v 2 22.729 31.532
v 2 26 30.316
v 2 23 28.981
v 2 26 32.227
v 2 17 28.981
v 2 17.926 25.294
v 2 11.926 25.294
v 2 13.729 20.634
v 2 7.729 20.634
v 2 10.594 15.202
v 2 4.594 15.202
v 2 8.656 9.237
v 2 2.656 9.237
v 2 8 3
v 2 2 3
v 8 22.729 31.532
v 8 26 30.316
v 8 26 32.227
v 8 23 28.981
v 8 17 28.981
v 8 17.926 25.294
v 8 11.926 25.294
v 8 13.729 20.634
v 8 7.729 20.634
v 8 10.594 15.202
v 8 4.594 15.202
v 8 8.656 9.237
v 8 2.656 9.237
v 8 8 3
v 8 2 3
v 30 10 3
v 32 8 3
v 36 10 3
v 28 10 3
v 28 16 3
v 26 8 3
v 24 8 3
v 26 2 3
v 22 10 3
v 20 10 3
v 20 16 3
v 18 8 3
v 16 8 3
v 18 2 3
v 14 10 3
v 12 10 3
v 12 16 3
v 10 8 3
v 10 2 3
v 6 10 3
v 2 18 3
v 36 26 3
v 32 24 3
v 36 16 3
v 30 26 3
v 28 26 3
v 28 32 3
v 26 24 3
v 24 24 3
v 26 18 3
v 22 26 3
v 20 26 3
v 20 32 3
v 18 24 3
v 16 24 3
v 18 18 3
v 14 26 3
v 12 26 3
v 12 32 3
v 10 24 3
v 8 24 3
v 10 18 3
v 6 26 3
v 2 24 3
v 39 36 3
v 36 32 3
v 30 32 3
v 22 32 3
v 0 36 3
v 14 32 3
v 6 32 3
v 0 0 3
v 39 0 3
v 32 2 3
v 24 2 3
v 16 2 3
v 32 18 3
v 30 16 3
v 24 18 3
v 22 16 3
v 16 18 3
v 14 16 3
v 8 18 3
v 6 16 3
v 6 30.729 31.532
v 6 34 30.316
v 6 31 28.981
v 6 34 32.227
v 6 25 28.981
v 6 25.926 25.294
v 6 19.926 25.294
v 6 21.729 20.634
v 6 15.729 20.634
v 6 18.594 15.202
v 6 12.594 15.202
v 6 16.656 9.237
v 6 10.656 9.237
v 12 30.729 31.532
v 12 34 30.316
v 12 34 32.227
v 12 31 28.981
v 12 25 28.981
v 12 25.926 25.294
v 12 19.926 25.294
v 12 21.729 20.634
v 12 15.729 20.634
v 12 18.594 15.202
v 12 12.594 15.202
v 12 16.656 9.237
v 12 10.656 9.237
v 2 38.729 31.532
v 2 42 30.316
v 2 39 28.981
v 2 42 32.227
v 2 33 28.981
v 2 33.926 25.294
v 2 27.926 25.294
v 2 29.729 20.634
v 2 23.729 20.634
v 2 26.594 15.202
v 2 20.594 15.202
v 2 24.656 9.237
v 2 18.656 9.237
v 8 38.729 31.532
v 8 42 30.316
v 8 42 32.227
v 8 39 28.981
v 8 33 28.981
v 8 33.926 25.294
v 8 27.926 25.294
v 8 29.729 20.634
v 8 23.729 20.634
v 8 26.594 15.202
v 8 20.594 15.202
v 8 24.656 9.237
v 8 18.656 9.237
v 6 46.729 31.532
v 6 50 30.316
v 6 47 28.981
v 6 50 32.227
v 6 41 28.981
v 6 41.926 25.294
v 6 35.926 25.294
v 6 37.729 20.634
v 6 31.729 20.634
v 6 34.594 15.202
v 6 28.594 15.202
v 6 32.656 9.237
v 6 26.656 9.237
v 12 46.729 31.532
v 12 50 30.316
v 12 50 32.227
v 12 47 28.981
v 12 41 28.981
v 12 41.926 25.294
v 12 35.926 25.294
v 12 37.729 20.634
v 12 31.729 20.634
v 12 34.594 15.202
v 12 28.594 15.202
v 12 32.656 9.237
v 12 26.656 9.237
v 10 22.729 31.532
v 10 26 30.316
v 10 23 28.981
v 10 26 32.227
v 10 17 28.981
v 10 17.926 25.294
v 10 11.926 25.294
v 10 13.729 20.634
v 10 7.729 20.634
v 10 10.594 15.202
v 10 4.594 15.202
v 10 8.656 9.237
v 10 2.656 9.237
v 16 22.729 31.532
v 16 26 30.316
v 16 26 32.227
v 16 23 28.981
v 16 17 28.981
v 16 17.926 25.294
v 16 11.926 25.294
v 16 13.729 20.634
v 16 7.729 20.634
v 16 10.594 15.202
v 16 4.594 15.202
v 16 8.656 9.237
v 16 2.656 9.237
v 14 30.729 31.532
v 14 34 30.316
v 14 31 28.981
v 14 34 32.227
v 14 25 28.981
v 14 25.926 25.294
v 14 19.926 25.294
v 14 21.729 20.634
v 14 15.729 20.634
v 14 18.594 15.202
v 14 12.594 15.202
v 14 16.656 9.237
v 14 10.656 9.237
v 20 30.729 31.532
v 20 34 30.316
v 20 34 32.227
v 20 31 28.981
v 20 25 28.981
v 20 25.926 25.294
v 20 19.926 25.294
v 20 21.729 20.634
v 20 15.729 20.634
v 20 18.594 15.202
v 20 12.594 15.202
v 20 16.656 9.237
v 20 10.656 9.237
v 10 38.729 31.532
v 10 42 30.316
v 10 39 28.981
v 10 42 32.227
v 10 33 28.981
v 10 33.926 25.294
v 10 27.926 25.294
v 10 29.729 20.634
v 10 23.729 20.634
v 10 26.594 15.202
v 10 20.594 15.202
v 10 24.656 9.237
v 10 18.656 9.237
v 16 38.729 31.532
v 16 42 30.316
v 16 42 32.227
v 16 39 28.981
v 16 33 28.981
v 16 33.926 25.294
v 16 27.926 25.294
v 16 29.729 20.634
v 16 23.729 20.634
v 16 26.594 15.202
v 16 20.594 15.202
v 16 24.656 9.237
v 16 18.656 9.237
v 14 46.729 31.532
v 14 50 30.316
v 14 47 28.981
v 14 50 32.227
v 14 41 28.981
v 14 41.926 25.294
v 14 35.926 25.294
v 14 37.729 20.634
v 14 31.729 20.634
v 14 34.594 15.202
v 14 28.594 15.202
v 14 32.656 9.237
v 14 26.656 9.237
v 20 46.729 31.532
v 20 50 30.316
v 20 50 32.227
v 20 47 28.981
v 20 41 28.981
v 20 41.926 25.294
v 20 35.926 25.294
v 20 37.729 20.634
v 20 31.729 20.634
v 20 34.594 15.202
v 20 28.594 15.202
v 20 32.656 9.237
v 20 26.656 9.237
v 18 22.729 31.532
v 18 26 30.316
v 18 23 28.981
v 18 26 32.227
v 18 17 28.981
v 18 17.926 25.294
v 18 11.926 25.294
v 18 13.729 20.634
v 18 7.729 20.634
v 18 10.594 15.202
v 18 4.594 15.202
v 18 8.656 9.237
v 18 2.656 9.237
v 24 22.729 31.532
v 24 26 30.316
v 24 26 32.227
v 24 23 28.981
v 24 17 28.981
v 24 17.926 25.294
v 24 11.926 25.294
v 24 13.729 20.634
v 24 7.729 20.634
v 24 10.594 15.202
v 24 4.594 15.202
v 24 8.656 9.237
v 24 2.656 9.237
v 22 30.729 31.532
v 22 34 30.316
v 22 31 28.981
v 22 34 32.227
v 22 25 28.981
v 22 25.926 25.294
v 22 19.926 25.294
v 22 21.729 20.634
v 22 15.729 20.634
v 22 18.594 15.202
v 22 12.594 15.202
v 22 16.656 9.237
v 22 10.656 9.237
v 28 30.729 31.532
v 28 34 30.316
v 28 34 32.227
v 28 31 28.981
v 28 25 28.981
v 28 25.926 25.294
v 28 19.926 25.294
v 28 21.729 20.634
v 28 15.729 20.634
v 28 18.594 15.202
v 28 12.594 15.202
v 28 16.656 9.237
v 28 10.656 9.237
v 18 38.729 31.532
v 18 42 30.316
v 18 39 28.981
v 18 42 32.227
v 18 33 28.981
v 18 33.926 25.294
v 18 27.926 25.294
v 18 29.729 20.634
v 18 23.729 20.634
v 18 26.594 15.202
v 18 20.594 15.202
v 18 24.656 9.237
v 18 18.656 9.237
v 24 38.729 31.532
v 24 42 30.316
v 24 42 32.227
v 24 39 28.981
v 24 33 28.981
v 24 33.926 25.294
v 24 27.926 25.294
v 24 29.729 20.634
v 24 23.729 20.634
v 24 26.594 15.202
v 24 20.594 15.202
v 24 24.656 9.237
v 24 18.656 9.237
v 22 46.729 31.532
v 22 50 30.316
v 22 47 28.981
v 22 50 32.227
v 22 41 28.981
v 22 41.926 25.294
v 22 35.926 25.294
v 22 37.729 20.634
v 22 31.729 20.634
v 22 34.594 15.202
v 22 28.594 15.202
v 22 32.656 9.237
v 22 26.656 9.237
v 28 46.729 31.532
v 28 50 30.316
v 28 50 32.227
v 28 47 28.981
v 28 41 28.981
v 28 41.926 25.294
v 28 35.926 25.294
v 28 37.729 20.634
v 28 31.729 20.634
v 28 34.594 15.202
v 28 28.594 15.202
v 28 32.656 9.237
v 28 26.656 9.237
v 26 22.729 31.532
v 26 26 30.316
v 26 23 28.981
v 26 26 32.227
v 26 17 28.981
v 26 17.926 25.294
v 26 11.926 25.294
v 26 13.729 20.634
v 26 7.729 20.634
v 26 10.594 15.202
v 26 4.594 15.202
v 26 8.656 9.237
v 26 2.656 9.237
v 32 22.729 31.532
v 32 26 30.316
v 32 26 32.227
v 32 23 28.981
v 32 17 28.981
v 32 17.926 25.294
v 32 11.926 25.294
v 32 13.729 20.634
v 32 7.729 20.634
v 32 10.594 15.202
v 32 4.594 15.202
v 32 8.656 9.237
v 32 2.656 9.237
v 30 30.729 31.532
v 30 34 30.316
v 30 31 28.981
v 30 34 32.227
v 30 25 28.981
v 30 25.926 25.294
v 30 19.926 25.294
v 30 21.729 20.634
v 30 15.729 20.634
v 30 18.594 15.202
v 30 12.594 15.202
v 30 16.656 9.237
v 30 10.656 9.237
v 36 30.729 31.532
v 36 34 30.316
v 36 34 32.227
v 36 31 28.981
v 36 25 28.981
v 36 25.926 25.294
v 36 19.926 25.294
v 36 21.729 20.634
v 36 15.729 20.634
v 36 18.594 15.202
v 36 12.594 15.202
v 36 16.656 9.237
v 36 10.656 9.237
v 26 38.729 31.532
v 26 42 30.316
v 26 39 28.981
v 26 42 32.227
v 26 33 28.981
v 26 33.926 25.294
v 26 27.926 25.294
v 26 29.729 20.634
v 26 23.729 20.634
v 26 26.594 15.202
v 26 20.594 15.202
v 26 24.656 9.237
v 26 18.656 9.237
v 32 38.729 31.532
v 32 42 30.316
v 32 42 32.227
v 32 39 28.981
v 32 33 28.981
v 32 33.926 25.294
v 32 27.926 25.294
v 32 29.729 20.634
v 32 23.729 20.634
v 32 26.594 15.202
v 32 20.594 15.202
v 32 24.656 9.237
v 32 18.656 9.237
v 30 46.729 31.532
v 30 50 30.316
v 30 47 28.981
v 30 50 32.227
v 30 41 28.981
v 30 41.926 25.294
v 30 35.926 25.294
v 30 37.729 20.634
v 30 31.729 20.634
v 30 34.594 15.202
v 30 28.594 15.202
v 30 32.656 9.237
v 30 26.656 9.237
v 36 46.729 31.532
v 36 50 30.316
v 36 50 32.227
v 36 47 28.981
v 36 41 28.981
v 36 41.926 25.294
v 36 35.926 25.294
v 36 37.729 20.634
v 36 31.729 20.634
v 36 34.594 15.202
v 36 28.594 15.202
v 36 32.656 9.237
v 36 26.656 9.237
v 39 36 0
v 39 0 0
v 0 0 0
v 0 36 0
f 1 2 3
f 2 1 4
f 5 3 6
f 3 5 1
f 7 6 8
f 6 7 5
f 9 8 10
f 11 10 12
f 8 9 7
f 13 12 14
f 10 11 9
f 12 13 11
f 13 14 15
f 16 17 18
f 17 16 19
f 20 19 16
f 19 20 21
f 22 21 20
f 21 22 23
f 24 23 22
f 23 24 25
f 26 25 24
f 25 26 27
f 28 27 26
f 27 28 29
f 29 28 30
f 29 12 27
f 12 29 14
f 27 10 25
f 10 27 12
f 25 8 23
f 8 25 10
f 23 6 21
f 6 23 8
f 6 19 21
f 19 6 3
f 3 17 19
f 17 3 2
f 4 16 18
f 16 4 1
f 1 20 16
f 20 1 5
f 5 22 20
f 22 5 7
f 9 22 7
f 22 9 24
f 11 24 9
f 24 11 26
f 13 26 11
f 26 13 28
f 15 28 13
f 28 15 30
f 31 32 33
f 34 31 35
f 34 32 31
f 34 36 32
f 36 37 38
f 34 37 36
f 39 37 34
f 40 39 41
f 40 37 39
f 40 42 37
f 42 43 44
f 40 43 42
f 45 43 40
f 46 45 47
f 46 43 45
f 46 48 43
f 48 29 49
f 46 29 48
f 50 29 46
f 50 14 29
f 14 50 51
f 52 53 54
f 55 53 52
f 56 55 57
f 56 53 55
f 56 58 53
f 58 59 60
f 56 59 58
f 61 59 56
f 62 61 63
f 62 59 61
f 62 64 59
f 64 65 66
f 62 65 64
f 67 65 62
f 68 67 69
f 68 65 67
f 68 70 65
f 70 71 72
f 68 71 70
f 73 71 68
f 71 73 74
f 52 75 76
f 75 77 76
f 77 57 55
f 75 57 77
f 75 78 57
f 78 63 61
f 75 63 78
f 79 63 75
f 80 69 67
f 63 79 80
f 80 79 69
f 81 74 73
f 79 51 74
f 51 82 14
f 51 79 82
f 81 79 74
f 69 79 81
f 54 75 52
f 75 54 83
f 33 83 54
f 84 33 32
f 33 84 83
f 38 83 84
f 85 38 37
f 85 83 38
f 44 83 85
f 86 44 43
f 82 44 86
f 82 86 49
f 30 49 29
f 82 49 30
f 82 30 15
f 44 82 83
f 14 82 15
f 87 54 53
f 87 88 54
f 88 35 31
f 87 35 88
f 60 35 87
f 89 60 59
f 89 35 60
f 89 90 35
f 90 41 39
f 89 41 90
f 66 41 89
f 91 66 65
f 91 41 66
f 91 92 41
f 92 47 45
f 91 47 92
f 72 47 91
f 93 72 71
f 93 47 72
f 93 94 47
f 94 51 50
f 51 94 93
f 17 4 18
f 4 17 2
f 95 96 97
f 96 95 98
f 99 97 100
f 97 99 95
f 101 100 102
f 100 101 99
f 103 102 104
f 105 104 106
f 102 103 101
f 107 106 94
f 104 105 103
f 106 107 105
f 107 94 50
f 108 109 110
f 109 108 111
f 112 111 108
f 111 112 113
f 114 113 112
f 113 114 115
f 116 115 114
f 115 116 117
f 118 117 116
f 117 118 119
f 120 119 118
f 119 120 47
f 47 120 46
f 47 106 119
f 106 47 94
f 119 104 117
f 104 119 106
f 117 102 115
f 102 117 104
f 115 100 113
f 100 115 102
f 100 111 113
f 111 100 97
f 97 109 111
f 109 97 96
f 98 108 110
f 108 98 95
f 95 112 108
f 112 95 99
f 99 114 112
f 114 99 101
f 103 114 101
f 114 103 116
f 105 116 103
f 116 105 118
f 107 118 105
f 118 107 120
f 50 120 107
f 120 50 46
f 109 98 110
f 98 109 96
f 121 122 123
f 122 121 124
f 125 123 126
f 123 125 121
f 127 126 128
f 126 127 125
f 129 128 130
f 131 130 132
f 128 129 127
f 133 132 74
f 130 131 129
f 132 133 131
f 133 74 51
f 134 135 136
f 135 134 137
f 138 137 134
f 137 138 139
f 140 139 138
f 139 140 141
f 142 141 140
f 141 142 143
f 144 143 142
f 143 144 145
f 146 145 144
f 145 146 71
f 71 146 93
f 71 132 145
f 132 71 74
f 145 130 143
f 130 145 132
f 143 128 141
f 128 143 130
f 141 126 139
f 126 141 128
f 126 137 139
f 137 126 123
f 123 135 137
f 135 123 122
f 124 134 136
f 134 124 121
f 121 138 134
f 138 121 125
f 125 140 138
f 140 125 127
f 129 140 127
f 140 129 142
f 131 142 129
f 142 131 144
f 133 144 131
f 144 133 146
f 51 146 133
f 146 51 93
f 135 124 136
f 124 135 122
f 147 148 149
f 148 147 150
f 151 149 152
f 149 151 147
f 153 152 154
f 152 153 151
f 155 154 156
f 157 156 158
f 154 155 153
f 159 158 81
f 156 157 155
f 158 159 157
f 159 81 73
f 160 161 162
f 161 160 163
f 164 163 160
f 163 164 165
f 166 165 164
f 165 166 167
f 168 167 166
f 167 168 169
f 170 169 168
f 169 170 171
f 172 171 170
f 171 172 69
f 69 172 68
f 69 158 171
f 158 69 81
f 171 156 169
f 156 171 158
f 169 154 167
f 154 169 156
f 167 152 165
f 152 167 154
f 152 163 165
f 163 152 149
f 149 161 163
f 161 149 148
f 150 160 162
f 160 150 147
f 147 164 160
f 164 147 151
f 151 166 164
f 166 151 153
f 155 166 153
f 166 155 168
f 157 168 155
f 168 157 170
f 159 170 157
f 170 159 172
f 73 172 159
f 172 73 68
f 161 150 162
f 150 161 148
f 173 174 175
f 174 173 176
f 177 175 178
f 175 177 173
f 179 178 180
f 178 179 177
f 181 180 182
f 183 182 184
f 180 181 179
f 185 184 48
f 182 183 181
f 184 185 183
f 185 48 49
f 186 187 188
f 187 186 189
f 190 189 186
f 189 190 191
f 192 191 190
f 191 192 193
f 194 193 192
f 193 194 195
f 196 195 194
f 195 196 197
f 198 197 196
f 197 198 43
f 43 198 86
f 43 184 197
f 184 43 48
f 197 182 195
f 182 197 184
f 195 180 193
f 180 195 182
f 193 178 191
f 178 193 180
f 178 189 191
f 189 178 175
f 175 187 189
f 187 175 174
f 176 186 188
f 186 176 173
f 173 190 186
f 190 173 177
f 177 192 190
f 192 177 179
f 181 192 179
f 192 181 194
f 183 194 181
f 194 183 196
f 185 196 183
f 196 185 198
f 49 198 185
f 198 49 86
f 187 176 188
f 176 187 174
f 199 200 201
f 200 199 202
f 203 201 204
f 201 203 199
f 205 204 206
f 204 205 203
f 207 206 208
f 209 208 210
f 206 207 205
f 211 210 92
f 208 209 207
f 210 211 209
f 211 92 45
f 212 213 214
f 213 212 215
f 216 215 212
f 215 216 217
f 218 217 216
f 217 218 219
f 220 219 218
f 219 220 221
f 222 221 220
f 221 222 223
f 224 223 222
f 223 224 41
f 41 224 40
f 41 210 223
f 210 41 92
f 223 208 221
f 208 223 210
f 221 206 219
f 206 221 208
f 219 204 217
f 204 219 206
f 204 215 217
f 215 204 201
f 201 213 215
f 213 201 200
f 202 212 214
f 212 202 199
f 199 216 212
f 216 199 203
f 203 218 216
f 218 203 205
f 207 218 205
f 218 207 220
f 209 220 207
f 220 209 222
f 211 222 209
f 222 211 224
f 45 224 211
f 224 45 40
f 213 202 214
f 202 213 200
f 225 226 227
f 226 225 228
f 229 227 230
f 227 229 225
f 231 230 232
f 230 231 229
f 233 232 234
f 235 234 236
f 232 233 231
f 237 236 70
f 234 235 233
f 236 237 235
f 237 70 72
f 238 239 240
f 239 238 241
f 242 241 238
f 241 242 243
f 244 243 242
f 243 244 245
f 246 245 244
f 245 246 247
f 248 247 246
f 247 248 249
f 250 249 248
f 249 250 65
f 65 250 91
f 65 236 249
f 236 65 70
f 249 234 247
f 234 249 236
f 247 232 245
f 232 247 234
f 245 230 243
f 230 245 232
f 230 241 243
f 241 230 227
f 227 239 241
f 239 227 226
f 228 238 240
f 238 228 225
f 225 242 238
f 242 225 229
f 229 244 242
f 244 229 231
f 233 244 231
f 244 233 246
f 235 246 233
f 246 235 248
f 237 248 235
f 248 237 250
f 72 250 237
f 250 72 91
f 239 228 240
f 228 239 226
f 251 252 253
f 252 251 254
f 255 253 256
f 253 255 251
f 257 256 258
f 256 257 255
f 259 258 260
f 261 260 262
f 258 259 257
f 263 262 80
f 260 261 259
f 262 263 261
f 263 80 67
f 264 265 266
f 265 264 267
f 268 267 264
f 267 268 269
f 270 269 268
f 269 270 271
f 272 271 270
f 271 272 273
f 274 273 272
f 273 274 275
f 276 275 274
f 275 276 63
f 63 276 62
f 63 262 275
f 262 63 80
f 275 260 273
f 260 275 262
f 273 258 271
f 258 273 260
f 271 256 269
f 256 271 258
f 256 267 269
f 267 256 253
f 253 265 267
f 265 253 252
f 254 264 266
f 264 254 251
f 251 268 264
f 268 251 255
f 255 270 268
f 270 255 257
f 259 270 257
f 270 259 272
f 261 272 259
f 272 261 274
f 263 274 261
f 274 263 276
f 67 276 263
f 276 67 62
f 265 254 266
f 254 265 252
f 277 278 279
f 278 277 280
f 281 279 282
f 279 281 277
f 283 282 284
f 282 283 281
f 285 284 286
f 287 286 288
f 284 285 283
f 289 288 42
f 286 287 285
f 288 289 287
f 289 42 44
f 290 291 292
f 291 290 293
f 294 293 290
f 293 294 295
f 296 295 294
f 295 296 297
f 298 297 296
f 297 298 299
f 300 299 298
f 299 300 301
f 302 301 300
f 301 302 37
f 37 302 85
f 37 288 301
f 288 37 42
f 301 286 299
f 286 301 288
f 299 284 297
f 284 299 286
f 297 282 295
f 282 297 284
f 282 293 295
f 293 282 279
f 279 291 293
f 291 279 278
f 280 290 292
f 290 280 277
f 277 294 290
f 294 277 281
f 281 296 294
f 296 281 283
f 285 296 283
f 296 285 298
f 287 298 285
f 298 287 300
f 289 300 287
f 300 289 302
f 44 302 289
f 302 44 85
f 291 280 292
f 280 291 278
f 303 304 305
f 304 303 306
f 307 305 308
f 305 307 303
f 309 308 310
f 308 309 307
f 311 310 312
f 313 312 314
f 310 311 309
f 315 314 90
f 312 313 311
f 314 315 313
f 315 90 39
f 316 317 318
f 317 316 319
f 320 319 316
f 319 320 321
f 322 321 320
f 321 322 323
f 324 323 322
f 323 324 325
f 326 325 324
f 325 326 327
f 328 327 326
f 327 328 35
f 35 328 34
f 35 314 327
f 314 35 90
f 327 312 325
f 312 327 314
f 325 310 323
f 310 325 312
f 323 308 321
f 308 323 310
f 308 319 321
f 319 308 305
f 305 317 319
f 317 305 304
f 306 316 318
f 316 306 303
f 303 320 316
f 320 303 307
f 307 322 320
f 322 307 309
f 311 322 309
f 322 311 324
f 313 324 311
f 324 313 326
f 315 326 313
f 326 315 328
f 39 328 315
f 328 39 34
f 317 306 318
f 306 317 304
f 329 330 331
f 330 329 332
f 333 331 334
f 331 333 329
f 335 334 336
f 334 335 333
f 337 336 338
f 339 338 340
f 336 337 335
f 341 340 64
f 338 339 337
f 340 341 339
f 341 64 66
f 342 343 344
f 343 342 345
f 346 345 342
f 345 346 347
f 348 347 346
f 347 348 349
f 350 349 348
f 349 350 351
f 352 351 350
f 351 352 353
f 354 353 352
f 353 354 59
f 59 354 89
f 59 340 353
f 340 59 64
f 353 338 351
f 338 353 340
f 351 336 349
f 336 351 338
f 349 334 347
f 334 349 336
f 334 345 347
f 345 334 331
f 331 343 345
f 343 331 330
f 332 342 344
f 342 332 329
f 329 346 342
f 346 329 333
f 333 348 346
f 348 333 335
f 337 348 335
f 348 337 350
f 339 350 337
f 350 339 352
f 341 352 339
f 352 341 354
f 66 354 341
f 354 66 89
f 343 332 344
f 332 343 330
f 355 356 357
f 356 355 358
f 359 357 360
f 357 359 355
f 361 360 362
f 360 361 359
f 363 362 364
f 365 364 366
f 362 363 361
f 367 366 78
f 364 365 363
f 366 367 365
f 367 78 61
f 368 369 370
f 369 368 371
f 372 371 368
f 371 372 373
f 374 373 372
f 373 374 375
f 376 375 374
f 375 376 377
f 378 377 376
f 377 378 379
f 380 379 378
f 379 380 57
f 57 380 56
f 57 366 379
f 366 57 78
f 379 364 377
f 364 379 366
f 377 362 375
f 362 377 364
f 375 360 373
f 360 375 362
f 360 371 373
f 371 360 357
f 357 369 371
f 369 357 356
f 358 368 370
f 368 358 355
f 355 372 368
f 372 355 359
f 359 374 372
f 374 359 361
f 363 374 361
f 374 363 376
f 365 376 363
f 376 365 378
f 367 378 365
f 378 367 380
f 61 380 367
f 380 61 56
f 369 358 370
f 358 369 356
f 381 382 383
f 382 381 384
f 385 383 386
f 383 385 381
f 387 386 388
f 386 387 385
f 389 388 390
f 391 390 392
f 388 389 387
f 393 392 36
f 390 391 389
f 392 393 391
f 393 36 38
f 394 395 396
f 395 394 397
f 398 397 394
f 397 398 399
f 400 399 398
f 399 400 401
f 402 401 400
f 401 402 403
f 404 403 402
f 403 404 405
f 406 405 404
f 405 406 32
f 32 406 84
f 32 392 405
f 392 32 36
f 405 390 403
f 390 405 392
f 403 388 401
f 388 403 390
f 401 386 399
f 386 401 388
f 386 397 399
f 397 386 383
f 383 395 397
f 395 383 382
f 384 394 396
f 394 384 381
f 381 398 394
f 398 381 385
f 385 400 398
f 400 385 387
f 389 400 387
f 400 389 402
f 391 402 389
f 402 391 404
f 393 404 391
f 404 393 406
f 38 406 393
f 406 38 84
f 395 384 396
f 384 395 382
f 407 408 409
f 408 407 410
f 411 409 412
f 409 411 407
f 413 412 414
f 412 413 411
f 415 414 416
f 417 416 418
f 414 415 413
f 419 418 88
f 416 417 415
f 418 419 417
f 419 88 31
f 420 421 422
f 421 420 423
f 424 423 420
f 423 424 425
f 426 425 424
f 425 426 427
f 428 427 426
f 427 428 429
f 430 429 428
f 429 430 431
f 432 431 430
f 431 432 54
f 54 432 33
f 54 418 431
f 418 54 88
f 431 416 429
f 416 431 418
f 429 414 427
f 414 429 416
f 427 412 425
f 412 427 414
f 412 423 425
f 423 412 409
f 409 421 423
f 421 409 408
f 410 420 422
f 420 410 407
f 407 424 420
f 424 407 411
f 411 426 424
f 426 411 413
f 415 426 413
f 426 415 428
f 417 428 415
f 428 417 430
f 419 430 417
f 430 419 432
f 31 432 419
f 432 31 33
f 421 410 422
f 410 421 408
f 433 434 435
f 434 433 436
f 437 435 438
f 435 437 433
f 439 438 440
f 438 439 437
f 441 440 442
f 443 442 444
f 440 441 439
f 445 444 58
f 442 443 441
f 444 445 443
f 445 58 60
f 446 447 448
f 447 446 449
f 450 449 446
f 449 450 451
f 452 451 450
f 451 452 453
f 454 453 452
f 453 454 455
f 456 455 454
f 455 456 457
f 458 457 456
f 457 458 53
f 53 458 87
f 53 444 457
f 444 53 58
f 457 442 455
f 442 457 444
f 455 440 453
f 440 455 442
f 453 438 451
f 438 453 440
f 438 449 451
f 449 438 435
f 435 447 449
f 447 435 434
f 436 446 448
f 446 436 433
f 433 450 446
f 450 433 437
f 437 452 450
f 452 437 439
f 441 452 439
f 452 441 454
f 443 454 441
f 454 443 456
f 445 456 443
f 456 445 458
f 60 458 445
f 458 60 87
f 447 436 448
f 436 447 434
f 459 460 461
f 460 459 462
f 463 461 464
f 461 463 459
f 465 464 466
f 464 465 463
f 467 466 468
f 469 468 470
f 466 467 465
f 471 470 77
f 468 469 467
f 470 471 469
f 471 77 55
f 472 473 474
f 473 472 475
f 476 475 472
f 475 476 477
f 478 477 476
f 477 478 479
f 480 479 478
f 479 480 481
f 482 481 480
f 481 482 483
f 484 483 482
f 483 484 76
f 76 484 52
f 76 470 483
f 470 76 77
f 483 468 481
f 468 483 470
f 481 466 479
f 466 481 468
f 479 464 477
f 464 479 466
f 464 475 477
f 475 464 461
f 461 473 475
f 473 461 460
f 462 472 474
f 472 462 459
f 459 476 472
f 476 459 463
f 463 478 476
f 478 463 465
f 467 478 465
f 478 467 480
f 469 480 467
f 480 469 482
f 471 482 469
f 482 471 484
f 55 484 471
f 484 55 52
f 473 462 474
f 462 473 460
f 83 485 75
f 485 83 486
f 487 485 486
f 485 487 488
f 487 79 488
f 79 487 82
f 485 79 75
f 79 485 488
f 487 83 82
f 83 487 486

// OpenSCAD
// Talons - grid or ring layout

// Layout
_Layout = "Grid";	// [Grid, Ring]

/* [Base] */
// Solid base
_SolidBase = true;

// Base thickness
_BaseThickness = 3;

// Base border
_BaseBorder = 2;

// Ring base outer radius
_RingBaseOuterRadius = 40;

// Ring base inner radis
_RingBaseInnerRadius = 30;

/* [Talon] */

// Talon radius
_TalonRadius = 30;

// Talon thickness
_TalonThickness = 6;

// Talon front/back offset
_TalonOffset = 6;

// Talon XY rotation
_TalonRotation = 0;

/* [Grid] */
// X spacing
_SpaceX = 8;

// Y spacing
_SpaceY = 8;

// X count
_CountX = 4;

// Y count
_CountY = 4;

/* [Main Ring] */

// Radius of first ring
_MainFirstRingRadius = 4;

// Step between rings
_MainRingRadiusStep = 10;

// Number of rings
_MainRingCount = 4;

// Talons per ring
_MainRingTalonCount = 8;

/* [Fill Ring] */

// Radius of first ring
_FillFirstRingRadius = 14;

// Step between rings
_FillRingRadiusStep = 10;

// Number of rings
_FillRingCount = 3;

// Talons per ring
_FillRingTalonCount = 8;

// Rotation
_FillRingRotate = 22.5;

module __end_cust() {};

//
// Render a Talon
//

module Talon(Radius, Thickness, Offset)
{
	color("blue")
	{
		intersection()
		{
			// Half-moon Talon
			translate([0, Radius, 0])
			{
				rotate([90, 0, 90])
				{
					linear_extrude(Thickness)
					{
						difference()
						{
							circle(Radius);
							
							translate([Offset, 0, 0])
							{
								circle(Radius);
							}
						}
					}
				}
			}
			
			// Box above Z = 0
			cube([Thickness, Radius - Offset, Radius]);
		}
	}
}

//
// Render a grid of talons
//

module TalonGrid(CountX, CountY, SpaceX, SpaceY, TalonRadius, TalonThickness, TalonOffset)
{
	for (X = [0 : 1 : CountX - 1])
	{
		for (Y = [0 : 1 : CountY - 1])
		{
			OddY = (Y % 2) == 1;
			
			PointX = OddY ? (X * SpaceX) + SpaceX / 2 : (X * SpaceX);
			PointY = Y * SpaceY;
			
			translate([PointX, PointY, 0])
			{
				Talon(TalonRadius, TalonThickness, TalonOffset);	
			}
		}
	}
}

//
// Render a ring of talons
//
// TODO:
//	Add stepping up or down of size

module TalonRing(FirstRingRadius, RingRadiusStep, RingRadiusCount, TalonCount, TalonRadius, TalonThickness, TalonOffset, TalonRotation)
{
	Theta = 360 / TalonCount;
			
	// Each ring
	if (RingRadiusCount > 0 && TalonCount > 0)
	{
		for (r = [0 : RingRadiusCount - 1])
		{
			// Each talon
			for (t = [0 : TalonCount - 1])
			{
				PointX = (FirstRingRadius + (r * RingRadiusStep)) * cos(t * Theta);
				PointY = (FirstRingRadius + (r * RingRadiusStep)) * sin(t * Theta);
				
				translate([PointX, PointY, 0])
				{
					rotate([0, 0, 270 + (t * Theta) + TalonRotation])
					{
						// Translate so talons are centered on ray
						translate([-TalonThickness / 2, 0, 0])
						{
							Talon(TalonRadius, TalonThickness, TalonOffset);	
						}
					}
				}
			}
		}
	}
}

module main()
{
	Z_Up = _SolidBase ? _BaseThickness : 0;
	
	translate([0, 0, Z_Up])
	{
		if (_Layout == "Grid")
		{
			translate([2, 2, 0])
			{
				TalonGrid(_CountX, _CountY, _SpaceX, _SpaceY, _TalonRadius, _TalonThickness, _TalonOffset);
			}
		}
		
		if (_Layout == "Ring")
		{
			// TODO:
			//	translate to center
			//	Compute size of base
			
			// Main ring
			color("red")
			{
				TalonRing(_MainFirstRingRadius, _MainRingRadiusStep, _MainRingCount, _MainRingTalonCount, _TalonRadius, _TalonThickness, _TalonOffset, _TalonRotation);
			}
			
			// Fill ring
			color("blue")
			{
				rotate([0, 0, _FillRingRotate])
				{
					TalonRing(_FillFirstRingRadius, _FillRingRadiusStep, _FillRingCount, _FillRingTalonCount, _TalonRadius, _TalonThickness, _TalonOffset, _TalonRotation);
				}
			}
		}
	}
	
	if (_SolidBase  && _Layout == "Grid")
	{
		CubeWidth = _BaseBorder + (_CountX * _SpaceX) + (_TalonThickness / 2) + _BaseBorder;
		CubeDepth = _BaseBorder + (_CountY * _SpaceY) + _BaseBorder;
		
		cube([CubeWidth, CubeDepth, _BaseThickness]);
	}
	
	if (_SolidBase && _Layout == "Ring")
	{
		translate([0, 0, Z_Up / 2])
		{
			difference()
			{
				// Matter
				cylinder(Z_Up, r=_RingBaseOuterRadius, center=true);
				
				// Anti-matter
				cylinder(Z_Up + .001, r=_RingBaseInnerRadius, center=true);			}
		}
	}
}

main();
